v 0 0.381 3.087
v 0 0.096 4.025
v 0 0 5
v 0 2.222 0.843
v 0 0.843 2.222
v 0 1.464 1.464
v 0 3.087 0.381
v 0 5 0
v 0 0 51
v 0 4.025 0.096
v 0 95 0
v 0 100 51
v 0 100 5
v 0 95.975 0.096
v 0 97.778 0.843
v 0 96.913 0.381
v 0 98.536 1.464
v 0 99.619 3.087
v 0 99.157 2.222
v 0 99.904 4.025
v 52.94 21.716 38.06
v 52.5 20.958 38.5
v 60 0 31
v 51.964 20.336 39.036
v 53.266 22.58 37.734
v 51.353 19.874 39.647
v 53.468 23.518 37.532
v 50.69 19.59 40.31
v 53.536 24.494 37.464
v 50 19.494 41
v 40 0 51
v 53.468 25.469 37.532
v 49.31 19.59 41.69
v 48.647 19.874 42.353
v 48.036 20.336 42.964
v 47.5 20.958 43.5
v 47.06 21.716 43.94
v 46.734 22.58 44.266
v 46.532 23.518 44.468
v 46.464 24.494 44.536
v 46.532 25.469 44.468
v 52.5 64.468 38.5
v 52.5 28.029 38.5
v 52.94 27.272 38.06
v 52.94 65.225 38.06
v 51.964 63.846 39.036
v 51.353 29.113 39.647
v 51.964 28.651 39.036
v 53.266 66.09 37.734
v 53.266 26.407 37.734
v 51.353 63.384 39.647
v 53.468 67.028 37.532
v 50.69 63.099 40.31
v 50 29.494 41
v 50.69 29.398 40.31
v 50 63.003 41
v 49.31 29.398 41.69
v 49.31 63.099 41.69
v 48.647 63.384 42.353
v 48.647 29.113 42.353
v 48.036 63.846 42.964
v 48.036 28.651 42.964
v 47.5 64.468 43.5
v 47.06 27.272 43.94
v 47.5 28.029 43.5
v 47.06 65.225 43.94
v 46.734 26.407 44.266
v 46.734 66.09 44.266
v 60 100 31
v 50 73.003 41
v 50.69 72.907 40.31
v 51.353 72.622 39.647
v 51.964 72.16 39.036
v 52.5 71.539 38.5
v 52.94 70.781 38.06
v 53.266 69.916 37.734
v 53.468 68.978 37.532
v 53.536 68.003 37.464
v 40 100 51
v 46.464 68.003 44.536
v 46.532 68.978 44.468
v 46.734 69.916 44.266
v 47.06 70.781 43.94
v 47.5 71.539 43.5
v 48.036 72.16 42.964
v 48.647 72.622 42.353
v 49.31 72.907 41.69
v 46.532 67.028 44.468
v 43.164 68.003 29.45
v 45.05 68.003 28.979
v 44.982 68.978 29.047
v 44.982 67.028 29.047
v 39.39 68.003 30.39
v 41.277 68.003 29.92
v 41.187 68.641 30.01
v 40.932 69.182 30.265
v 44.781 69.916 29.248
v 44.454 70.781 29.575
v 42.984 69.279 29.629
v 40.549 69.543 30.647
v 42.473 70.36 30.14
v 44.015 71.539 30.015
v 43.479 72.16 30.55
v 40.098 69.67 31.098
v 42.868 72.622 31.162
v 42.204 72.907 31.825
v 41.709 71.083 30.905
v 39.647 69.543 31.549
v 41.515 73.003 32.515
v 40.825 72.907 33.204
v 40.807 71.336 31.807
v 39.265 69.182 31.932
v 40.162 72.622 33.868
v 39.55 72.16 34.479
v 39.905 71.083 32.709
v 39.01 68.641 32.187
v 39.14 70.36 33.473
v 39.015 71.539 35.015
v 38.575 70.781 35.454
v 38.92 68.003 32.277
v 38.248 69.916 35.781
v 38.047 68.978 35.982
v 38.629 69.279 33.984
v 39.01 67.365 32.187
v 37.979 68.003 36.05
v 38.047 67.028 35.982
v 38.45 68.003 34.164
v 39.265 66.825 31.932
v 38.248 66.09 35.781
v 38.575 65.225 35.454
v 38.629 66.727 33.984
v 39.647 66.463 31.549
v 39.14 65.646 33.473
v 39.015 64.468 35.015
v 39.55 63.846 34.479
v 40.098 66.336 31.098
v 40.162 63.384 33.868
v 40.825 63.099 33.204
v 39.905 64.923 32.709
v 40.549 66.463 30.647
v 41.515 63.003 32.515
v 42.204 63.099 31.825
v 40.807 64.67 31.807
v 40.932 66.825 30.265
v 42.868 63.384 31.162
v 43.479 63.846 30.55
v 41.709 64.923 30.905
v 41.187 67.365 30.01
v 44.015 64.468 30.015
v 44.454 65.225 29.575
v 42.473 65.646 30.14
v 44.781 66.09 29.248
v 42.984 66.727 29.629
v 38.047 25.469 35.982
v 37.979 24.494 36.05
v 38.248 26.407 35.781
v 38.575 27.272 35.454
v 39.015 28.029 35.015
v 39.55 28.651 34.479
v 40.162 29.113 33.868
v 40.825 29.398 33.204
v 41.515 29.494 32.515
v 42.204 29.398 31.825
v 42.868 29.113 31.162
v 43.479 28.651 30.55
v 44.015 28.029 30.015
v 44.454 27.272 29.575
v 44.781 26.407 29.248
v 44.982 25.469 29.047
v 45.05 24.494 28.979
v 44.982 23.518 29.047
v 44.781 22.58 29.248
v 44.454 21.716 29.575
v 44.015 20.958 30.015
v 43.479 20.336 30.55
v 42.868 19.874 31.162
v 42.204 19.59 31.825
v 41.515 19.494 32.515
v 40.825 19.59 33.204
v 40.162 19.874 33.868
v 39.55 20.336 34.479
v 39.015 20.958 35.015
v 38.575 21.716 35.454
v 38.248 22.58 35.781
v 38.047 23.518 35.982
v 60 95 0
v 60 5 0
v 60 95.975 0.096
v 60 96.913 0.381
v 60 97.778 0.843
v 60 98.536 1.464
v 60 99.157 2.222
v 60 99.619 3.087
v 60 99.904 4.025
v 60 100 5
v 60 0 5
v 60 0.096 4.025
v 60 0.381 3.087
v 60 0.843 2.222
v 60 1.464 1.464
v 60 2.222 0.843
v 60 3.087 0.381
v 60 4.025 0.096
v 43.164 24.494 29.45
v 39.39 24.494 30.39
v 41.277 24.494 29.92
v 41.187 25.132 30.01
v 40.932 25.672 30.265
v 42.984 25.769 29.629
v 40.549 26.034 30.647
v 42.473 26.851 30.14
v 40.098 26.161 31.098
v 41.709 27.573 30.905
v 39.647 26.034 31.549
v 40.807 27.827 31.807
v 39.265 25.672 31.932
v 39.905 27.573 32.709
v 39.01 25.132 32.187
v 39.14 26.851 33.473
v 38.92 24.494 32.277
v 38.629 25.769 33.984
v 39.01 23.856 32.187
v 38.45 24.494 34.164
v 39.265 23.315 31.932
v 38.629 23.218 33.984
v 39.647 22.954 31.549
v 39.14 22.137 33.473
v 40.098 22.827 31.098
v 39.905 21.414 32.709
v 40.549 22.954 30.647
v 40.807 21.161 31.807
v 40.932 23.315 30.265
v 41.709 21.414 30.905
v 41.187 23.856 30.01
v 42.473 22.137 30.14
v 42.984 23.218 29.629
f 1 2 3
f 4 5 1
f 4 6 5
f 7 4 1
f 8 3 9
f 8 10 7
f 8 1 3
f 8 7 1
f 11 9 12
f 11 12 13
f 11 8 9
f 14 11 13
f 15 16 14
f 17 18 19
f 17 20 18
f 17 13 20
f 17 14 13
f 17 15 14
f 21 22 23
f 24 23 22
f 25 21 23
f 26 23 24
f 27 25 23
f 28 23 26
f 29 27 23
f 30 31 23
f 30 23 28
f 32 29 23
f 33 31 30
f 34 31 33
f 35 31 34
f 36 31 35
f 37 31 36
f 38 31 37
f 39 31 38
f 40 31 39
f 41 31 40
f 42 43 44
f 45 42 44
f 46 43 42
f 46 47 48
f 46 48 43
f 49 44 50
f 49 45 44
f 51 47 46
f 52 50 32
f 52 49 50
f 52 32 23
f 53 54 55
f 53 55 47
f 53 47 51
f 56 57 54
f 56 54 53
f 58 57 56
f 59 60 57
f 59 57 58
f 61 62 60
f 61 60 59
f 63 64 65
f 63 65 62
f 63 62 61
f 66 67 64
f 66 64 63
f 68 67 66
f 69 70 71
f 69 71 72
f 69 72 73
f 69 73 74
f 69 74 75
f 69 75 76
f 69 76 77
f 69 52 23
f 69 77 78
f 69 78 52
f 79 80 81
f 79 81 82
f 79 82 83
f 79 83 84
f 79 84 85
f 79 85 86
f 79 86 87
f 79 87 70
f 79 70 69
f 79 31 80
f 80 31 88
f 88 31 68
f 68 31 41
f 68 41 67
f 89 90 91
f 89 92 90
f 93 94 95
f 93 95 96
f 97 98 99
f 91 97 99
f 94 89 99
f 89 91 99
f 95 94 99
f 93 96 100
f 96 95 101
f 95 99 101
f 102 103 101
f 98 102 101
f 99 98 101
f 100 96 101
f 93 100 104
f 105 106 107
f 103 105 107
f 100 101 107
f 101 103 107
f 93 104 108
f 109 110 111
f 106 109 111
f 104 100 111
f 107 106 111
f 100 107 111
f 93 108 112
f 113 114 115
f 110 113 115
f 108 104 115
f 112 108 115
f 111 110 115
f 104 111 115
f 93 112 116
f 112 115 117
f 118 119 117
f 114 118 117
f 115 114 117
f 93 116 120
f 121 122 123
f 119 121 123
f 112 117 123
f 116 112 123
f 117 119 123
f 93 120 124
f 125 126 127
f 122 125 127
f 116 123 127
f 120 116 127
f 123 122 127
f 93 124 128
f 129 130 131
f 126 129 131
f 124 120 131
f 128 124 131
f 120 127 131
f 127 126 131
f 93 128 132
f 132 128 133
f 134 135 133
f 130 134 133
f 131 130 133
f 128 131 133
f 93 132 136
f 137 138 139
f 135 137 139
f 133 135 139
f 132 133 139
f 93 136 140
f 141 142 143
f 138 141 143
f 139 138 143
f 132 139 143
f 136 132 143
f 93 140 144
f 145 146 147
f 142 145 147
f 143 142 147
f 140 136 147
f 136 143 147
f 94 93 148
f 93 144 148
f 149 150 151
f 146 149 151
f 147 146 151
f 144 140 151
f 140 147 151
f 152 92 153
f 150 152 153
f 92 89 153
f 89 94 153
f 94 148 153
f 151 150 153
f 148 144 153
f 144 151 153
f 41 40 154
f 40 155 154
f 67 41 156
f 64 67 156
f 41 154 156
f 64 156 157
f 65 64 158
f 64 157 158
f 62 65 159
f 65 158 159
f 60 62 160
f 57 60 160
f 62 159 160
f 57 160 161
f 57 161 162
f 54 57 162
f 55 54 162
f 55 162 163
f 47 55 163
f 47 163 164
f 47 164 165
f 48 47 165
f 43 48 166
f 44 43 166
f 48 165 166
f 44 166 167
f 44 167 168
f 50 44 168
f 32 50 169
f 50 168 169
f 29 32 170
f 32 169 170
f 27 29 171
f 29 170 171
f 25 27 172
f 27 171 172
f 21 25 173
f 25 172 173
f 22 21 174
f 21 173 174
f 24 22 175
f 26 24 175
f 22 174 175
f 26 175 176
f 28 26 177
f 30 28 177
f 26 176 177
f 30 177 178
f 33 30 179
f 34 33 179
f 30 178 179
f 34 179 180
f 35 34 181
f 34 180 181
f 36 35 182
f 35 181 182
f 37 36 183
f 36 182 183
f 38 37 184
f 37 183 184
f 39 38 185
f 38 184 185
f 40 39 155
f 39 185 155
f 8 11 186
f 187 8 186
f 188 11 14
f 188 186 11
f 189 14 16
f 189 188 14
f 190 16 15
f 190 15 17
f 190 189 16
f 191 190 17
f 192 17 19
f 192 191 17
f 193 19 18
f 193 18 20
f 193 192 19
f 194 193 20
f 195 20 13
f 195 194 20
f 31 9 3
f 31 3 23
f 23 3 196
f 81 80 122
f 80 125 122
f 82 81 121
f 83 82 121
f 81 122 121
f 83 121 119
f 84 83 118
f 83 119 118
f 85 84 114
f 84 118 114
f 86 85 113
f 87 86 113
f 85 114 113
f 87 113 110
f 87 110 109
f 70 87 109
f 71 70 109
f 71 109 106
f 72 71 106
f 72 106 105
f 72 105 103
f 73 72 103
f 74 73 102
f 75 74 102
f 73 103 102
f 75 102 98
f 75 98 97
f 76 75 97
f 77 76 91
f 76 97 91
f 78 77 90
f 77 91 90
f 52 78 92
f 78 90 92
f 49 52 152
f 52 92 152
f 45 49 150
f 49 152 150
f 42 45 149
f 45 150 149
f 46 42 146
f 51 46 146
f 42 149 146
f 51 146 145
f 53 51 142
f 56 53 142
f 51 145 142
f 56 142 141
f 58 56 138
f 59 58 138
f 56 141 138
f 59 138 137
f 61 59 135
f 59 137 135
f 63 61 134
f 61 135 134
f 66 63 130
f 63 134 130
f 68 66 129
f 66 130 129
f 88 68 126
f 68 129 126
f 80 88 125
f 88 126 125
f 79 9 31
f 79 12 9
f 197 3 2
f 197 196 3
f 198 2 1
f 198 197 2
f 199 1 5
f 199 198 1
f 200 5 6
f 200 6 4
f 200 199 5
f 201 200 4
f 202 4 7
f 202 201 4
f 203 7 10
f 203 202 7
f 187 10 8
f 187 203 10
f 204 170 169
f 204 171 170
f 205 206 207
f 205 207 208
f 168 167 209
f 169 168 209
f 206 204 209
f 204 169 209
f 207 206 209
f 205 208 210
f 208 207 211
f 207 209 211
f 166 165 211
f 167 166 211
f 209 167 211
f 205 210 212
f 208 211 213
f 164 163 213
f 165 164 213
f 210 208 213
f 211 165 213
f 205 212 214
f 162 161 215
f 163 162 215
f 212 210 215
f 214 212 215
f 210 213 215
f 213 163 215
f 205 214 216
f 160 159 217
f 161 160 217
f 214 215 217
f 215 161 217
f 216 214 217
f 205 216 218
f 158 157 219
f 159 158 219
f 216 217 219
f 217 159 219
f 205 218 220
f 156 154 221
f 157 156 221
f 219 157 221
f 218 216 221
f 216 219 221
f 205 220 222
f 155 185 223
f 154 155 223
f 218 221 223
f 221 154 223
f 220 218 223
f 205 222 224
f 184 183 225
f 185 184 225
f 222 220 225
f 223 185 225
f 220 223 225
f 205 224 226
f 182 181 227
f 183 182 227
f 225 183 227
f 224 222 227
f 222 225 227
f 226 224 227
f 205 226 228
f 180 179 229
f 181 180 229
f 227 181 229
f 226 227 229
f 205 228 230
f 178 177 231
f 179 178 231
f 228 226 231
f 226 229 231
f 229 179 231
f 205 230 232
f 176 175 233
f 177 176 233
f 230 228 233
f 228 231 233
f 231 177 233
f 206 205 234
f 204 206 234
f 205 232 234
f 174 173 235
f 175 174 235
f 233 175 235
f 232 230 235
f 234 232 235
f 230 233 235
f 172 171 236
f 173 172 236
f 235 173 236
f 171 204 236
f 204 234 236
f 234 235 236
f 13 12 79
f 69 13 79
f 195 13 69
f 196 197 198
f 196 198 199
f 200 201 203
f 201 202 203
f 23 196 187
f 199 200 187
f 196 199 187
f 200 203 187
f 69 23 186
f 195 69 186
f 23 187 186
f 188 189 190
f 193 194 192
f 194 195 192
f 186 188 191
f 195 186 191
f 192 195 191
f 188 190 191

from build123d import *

# Parameters (mm, degrees)
F0_W     = 60
F0_H     = 100
F1_DEPTH = 51
F2_SIZE  = 20
F4_D     = 10
F4_DEPTH = 12
F4_TIP   = 3.0043030951
F5_R     = 5


with BuildPart() as f1:
    # F0 (on Top) → F1 (new body)
    with BuildSketch(Plane.XY):
        with Locations((30, 50)):
            Rectangle(F0_W, F0_H)
    extrude(amount=F1_DEPTH)

    # F2
    f2_edges = [f1.edges().sort_by_distance(p)[0] for p in [
        (60, 50, 51),
    ]]
    chamfer(f2_edges, length=F2_SIZE)

    # F4
    with Locations(Plane(origin=(45.5, 0, 45.5), x_dir=(0.7071067812, 0, -0.7071067812), z_dir=(0.7071067812, 0, 0.7071067812))):
        with Locations((6.3639610307, 24.4938470423), (6.3639610307, 68.0030360818)):
            Hole(F4_D / 2, depth=F4_DEPTH)
            with Locations((0, 0, -(F4_DEPTH + F4_TIP / 2))):  # 118° drill point
                Cone(0, F4_D / 2, F4_TIP, mode=Mode.SUBTRACT)

    # F5
    f5_edges = [f1.edges().sort_by_distance(p)[0] for p in [
        (30, 100, 0),
        (30, 0, 0),
    ]]
    fillet(f5_edges, radius=F5_R)


solid = f1.part
